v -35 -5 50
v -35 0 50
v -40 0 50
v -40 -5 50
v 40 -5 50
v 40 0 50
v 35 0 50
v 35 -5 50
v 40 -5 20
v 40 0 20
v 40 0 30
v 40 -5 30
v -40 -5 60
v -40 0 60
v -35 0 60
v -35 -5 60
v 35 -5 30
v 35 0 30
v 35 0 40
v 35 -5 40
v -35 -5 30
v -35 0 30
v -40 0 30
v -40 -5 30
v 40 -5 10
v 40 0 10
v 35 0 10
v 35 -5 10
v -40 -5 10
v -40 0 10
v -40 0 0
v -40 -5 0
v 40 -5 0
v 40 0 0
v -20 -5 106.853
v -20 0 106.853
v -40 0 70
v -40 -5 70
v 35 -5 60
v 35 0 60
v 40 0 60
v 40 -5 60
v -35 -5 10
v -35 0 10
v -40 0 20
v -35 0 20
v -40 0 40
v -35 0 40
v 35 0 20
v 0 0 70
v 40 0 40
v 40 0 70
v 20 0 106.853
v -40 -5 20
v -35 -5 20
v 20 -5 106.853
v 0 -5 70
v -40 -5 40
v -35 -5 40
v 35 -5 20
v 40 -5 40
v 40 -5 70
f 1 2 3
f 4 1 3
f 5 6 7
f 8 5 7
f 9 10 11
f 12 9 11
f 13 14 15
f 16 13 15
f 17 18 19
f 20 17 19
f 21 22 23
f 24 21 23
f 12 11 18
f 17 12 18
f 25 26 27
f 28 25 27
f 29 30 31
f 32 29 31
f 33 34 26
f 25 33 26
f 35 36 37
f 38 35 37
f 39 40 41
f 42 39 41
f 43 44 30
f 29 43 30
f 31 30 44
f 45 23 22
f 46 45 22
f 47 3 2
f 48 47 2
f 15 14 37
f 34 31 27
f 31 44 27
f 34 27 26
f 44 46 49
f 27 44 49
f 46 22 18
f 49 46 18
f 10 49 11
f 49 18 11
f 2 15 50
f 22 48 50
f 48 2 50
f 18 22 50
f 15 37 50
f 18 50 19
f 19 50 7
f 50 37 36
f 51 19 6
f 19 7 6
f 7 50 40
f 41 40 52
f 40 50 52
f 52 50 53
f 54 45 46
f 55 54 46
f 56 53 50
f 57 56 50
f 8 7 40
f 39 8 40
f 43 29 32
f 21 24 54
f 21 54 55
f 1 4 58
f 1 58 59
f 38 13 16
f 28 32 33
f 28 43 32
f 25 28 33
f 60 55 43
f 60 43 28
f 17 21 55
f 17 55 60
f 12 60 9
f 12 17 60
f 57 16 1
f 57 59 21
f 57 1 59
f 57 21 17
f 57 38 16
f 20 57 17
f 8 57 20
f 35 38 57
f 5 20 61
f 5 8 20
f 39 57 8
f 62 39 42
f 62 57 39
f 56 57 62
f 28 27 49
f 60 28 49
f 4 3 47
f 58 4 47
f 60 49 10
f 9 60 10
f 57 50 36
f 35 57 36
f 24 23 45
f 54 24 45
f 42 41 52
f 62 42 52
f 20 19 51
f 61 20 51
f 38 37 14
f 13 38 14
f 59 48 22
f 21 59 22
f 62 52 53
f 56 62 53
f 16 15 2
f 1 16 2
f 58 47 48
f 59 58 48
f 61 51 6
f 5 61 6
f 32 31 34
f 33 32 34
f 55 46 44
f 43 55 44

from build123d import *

# Parameters (mm, degrees)
F1_DEPTH = 5


with BuildPart() as f1:
    # F0 (on Front) → F1 (new body)
    with BuildSketch(Plane.XZ):
        Polygon((-40, 10), (-40, 0), (0, 0), (0, 70), (-40, 70), (-40, 60), (-35, 60), (-35, 50), (-40, 50), (-40, 40), (-35, 40), (-35, 30), (-40, 30), (-40, 20), (-35, 20), (-35, 10), align=None)
        Polygon((0, 70), (0, 0), (40, 0), (40, 10), (35, 10), (35, 20), (40, 20), (40, 30), (35, 30), (35, 40), (40, 40), (40, 50), (35, 50), (35, 60), (40, 60), (40, 70), align=None)
        Polygon((-40, 70), (0, 70), (-20, 106.853262), align=None)
        Polygon((20, 106.853262), (0, 70), (40, 70), align=None)
    extrude(amount=F1_DEPTH)


solid = f1.part
